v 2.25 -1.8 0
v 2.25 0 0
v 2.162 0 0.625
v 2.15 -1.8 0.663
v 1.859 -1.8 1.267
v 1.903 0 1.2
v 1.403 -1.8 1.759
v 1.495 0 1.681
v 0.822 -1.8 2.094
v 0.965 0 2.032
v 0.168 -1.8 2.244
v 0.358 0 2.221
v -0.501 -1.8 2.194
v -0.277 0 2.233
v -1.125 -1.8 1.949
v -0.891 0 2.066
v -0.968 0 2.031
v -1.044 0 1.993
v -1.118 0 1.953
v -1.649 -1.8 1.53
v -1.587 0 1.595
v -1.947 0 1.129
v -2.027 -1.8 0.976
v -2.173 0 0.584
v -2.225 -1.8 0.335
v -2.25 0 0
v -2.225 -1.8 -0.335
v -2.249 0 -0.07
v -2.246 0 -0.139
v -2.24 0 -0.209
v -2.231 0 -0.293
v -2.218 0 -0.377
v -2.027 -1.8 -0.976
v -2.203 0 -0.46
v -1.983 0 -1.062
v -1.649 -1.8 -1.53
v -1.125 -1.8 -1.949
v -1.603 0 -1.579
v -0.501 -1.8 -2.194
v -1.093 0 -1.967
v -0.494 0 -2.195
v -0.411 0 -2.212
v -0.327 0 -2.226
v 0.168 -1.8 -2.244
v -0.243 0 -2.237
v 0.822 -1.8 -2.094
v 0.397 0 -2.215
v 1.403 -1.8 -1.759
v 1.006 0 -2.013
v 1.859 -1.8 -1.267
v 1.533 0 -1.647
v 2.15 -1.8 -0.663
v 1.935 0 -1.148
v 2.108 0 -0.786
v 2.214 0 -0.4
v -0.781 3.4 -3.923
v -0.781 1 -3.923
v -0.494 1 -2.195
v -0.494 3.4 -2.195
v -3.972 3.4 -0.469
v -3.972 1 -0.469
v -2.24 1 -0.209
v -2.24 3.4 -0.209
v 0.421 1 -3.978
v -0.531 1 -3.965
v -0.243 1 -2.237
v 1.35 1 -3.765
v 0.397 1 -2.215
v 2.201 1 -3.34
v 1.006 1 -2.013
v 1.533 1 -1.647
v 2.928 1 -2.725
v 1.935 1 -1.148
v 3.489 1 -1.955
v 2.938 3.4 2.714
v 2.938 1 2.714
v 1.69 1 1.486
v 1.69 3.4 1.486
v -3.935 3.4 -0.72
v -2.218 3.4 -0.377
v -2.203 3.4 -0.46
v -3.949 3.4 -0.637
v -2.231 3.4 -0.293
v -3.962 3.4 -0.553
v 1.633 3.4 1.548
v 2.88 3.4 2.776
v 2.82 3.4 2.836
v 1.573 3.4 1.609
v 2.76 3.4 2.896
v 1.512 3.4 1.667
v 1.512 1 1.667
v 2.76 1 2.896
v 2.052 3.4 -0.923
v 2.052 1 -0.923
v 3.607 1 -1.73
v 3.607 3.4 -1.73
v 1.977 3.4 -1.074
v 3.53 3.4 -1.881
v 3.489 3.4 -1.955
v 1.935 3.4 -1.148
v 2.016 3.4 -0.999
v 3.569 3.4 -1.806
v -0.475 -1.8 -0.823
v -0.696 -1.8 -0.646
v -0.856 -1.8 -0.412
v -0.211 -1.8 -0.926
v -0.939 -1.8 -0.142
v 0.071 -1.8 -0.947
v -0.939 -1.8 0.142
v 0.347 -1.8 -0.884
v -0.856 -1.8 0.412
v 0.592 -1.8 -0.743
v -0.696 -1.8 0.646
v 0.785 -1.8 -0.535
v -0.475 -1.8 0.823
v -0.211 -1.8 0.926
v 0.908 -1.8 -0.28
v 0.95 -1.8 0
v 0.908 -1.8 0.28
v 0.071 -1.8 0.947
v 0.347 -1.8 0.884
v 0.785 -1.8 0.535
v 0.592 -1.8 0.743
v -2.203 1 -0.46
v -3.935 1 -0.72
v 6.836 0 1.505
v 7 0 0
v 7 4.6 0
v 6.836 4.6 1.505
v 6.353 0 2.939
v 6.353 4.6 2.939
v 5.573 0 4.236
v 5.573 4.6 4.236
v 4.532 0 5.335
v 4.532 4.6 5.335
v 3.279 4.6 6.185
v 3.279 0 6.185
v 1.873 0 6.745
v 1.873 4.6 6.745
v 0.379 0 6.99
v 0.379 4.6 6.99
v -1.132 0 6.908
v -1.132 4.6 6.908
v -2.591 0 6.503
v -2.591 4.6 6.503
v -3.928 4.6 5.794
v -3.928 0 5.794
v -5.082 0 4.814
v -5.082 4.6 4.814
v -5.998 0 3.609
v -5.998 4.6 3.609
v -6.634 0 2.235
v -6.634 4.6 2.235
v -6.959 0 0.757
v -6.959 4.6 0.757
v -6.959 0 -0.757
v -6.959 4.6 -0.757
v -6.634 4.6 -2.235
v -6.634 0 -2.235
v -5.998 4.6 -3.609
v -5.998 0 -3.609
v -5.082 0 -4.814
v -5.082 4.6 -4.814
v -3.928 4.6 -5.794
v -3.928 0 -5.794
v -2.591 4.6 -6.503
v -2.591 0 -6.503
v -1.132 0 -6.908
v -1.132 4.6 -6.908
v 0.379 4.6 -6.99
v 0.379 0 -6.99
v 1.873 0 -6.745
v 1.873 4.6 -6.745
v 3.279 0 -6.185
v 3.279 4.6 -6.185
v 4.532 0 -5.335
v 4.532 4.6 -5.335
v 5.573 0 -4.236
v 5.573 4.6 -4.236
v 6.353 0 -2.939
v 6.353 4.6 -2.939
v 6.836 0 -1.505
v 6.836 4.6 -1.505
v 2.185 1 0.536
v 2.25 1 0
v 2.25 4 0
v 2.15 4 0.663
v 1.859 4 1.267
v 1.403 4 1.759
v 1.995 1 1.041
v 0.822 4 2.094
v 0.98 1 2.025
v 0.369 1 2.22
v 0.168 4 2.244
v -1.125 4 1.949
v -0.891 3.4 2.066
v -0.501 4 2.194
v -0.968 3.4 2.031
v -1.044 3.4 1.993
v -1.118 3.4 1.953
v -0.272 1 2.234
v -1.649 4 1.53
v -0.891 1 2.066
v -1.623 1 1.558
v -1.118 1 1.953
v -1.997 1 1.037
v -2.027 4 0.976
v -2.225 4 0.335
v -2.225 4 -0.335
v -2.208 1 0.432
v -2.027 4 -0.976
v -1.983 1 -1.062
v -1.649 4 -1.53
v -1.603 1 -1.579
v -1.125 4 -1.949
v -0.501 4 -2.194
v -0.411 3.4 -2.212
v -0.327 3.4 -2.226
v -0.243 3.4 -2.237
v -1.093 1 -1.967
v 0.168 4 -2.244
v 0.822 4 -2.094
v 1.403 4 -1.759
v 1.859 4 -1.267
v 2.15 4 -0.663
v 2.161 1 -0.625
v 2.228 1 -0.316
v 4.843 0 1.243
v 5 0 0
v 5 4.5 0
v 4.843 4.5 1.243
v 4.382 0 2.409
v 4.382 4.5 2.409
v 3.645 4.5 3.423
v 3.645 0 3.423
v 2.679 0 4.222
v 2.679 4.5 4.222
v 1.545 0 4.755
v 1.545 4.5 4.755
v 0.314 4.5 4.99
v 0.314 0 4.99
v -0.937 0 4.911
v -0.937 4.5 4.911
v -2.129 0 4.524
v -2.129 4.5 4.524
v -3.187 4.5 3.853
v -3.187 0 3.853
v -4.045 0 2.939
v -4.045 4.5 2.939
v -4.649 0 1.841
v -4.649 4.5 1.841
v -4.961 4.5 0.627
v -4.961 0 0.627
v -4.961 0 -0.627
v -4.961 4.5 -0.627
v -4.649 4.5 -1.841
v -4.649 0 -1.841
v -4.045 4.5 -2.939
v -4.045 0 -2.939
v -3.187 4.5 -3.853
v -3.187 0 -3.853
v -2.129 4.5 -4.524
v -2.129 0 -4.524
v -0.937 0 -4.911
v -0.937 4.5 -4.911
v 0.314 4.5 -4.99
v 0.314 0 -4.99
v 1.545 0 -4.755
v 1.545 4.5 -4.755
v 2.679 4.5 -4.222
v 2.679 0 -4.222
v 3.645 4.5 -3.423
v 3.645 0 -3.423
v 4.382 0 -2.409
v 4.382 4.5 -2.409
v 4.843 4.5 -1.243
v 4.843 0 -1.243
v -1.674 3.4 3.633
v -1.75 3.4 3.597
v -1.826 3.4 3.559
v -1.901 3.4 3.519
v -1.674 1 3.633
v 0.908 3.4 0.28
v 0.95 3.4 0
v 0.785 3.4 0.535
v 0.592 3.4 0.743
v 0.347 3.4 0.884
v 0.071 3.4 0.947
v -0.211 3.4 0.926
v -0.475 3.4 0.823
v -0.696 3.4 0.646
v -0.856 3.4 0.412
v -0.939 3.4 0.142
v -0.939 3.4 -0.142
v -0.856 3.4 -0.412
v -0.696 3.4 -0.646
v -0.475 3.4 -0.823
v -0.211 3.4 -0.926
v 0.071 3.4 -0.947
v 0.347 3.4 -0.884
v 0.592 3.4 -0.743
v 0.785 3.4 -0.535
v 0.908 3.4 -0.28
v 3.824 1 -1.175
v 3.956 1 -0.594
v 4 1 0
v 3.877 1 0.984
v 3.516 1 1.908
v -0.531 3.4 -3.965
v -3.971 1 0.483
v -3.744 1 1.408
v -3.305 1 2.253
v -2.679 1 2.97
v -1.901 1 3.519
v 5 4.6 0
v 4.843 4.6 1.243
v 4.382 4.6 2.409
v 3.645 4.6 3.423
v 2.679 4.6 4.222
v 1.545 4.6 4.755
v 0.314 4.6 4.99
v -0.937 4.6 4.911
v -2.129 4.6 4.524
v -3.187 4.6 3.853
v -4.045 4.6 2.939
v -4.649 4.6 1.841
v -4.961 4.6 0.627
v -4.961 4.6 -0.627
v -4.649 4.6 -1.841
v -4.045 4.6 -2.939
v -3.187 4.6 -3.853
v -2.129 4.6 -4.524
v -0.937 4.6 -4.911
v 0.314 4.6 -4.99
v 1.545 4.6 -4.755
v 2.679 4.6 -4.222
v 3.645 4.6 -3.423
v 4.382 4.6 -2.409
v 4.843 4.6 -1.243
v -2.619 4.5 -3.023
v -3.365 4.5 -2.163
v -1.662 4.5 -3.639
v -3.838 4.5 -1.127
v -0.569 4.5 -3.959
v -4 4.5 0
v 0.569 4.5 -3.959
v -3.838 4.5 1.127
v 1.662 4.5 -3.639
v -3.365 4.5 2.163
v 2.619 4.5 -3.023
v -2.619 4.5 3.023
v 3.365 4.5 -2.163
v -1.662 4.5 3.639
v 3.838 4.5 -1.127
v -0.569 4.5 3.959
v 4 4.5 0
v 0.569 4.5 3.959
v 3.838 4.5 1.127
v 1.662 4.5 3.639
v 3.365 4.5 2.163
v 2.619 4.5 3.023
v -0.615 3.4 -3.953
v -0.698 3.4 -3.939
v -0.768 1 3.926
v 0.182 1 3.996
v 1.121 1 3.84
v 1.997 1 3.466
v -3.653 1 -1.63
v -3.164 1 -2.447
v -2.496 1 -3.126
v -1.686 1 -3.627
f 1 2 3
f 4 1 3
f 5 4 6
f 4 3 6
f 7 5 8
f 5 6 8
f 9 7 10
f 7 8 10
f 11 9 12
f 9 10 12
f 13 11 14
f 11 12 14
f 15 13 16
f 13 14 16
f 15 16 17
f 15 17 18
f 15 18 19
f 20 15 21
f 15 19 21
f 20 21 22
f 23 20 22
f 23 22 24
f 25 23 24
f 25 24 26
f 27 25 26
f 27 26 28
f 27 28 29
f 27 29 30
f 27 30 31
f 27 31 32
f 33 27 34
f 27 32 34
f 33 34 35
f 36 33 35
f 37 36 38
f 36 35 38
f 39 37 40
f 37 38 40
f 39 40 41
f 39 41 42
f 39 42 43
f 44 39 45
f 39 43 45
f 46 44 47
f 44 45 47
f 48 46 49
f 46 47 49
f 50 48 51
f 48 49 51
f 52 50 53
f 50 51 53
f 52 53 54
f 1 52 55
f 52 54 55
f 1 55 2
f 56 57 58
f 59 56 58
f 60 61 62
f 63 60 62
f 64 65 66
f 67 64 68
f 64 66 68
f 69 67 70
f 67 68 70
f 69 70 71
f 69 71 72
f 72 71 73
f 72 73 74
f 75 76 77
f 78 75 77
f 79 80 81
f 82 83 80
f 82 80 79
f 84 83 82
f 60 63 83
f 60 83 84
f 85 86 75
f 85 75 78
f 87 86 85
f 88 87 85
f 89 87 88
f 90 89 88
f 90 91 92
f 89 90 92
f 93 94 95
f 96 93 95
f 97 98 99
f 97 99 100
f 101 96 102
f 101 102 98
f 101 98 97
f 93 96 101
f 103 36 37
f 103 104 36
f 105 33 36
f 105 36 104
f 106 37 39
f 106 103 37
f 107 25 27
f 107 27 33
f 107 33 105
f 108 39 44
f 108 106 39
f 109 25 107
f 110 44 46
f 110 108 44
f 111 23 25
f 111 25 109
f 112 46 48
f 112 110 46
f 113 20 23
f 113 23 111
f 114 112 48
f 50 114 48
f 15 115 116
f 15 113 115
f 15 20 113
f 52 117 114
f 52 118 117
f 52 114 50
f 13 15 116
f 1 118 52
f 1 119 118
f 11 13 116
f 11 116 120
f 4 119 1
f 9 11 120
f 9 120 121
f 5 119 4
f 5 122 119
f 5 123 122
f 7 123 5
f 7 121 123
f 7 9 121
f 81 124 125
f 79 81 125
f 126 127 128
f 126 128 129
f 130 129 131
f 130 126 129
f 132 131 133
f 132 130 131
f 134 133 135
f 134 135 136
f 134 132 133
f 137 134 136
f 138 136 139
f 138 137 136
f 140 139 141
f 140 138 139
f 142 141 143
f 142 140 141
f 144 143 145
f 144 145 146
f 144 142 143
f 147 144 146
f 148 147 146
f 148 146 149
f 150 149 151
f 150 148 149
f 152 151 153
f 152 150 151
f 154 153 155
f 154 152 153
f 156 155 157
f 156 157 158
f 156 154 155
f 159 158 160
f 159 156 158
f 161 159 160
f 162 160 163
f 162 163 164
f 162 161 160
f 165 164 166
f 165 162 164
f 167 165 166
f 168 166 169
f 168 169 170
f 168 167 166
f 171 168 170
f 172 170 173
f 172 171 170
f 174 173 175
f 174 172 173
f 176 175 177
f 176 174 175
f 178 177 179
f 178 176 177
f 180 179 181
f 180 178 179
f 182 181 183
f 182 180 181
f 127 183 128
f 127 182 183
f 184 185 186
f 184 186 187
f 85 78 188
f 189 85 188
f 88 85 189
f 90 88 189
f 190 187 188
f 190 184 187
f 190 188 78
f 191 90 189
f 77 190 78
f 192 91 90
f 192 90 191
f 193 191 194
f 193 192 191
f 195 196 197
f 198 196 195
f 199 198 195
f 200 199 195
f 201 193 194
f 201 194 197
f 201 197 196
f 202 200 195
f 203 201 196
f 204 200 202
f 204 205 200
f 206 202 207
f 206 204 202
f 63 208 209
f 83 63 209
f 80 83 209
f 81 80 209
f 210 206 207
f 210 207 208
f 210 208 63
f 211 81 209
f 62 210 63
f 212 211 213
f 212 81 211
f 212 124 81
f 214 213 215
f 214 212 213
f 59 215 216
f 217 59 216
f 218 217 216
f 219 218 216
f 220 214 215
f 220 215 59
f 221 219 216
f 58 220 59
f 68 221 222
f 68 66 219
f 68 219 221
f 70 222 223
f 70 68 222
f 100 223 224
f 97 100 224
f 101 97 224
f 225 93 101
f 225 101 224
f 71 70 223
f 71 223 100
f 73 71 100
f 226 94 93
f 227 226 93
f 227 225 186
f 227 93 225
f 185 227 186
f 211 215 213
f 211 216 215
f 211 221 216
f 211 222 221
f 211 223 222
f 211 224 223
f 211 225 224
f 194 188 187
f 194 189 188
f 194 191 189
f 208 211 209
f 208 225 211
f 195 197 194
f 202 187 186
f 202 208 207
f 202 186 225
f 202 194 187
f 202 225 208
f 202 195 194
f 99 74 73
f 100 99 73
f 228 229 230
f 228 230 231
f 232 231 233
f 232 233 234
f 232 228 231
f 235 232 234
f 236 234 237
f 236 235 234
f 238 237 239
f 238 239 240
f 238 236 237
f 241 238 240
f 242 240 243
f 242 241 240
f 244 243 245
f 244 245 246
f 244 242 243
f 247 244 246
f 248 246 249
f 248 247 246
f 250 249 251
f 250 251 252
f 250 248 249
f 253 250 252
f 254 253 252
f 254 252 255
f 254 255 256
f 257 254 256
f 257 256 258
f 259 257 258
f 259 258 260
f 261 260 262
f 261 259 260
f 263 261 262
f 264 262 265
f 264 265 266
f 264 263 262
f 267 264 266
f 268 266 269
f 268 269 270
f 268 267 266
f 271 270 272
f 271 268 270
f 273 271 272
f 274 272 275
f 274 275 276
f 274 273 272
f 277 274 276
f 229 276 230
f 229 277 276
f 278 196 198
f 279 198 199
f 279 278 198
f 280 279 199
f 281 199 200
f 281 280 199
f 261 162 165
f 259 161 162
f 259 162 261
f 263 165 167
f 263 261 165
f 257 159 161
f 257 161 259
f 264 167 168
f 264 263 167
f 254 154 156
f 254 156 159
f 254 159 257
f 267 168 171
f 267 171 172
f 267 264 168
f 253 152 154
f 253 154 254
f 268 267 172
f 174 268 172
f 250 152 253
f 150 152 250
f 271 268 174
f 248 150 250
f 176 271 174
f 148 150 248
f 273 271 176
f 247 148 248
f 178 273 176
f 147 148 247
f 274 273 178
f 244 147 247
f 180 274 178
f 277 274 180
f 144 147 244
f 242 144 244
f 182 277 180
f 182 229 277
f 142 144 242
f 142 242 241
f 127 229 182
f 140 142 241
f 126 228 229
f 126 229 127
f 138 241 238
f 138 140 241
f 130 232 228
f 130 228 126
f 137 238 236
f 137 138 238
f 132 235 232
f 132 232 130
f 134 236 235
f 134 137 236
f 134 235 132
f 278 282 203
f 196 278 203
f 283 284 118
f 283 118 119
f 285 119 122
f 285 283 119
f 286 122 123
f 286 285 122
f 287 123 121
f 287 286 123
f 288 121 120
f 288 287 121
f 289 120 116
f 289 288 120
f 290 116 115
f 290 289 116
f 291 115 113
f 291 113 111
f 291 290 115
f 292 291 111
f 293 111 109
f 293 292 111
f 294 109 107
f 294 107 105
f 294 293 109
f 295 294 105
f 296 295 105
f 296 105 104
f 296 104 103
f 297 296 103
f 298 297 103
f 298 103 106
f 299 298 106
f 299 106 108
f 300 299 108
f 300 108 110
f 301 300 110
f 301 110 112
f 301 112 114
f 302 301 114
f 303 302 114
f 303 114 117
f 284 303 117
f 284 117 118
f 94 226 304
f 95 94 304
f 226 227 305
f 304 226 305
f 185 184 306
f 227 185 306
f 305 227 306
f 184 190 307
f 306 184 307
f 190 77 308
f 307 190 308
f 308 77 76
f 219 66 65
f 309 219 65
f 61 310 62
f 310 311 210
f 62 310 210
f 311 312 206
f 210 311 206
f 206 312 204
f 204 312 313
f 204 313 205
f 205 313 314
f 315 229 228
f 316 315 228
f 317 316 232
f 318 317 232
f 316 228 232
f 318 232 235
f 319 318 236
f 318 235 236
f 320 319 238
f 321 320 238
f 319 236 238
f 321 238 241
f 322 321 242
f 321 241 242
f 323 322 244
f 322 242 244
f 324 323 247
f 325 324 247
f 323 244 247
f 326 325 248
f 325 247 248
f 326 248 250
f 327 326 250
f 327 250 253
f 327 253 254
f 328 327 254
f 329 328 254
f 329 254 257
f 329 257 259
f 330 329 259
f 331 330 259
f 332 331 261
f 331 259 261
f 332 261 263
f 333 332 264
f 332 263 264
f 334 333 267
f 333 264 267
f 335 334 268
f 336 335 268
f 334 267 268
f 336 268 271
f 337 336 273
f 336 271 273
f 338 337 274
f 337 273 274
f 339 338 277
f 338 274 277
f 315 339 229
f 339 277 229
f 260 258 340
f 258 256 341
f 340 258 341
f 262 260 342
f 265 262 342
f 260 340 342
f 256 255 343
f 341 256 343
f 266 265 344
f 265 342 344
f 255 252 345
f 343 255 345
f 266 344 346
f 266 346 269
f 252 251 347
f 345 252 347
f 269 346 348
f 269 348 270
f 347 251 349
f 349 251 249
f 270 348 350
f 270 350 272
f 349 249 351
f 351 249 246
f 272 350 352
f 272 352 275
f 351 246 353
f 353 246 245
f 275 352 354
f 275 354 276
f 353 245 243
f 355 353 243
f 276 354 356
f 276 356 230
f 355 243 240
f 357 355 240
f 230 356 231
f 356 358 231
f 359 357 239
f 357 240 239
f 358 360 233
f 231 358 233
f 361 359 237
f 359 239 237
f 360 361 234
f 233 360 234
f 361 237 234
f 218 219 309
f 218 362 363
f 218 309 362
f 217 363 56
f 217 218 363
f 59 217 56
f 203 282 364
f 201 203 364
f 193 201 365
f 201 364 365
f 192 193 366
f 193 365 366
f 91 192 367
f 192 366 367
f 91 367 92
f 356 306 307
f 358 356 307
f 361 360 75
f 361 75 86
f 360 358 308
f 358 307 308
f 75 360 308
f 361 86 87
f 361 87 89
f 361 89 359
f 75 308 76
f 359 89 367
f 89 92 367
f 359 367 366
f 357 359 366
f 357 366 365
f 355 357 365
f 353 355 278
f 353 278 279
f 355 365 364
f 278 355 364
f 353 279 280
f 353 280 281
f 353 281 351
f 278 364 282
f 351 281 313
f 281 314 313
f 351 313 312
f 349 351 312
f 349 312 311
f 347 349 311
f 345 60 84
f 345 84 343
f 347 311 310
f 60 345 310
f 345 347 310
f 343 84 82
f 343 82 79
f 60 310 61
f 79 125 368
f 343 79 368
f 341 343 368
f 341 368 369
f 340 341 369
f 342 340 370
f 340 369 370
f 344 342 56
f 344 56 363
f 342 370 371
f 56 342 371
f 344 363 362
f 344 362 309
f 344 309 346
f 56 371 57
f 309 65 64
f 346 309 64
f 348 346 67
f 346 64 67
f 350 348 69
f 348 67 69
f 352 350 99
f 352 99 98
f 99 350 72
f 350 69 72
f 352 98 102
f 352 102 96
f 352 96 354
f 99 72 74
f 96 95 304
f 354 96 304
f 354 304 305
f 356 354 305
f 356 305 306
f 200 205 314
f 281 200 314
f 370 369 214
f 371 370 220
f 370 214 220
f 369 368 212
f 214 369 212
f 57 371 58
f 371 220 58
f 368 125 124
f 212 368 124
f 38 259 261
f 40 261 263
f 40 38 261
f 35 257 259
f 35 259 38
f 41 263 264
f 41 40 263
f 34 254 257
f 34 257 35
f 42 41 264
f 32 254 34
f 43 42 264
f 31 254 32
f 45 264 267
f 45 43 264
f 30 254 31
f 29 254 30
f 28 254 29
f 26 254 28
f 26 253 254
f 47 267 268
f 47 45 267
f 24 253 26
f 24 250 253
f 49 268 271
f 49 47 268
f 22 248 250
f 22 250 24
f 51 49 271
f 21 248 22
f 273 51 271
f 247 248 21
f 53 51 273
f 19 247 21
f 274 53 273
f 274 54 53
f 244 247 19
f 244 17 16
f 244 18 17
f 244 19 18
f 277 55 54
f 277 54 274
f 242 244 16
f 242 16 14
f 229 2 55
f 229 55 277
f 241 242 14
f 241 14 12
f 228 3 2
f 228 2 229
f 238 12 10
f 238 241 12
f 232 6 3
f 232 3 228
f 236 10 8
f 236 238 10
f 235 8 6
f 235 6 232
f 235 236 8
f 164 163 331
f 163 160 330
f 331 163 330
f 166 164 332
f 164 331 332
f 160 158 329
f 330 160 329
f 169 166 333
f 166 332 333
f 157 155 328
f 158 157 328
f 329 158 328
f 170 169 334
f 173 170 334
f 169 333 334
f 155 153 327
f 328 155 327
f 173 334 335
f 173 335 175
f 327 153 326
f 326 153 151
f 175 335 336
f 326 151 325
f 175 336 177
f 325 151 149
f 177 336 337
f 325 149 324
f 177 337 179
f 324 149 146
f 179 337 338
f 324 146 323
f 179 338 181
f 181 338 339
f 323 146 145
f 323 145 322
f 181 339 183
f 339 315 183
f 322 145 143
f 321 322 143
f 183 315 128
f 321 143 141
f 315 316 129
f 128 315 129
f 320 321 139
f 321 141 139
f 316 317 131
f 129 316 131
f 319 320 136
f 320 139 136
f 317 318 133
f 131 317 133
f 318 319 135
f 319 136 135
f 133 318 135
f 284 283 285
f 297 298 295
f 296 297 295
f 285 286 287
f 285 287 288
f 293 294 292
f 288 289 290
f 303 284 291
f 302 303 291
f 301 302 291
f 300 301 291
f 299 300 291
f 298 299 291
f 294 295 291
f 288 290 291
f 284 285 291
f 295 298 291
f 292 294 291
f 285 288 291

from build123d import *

# Parameters (mm, degrees)
F0_R          = 7
F0_R_2        = 5
F1_DEPTH      = 4.6
F0_R_3        = 4
F2_DEPTH      = 4.5
F0_R_4        = 2.25
F3_DEPTH      = 1
F0_R_5        = 0.95
F4_DEPTH      = 4
F4_DEPTH_BACK = 1.8
F6_DEPTH      = 2.4
F5_R          = 0.95
F7_DEPTH      = 1
F8_R          = 0.95
F9_DEPTH      = 0.6


with BuildPart() as f1:
    # F0 (on Front) → F1 (new body)
    with BuildSketch(Plane.XZ):
        Circle(F0_R)
        Circle(F0_R_2, mode=Mode.SUBTRACT)
    extrude(amount=-F1_DEPTH)


with BuildPart() as f2:
    # F0 (on Front) → F2 (new body)
    with BuildSketch(Plane.XZ):
        Circle(F0_R_2)
        Circle(F0_R_3, mode=Mode.SUBTRACT)
    extrude(amount=-F2_DEPTH)

    # F0 (on Front) → F3 (join)
    with BuildSketch(Plane.XZ):
        Circle(F0_R_3)
        Circle(F0_R_4, mode=Mode.SUBTRACT)
    extrude(amount=-F3_DEPTH)

    # F0 (on Front) → F4 (join, two sides)
    with BuildSketch(Plane.XZ) as f4_sk:
        Circle(F0_R_4)
        Circle(F0_R_5, mode=Mode.SUBTRACT)
    extrude(amount=-F4_DEPTH)
    extrude(f4_sk.sketch, amount=F4_DEPTH_BACK)

    # F5 (on face) → F6, piece 2 (join)
    with BuildSketch(Plane(origin=(0, 1, 0), x_dir=(-1, 0, 0), z_dir=(0, 1, 0))):
        with BuildLine():
            ThreePointArc((1.9010607717, 3.51937039), (1.7882791688, 3.5779963128), (1.673691774, 3.6330091998))
            Line((1.673691774, 3.6330091998), (0.8906165084, 2.066228989))
            ThreePointArc((0.8906165084, 2.066228989), (1.0059070324, 2.012622926), (1.1179855061, 1.9525901793))
            Line((1.1179855061, 1.9525901793), (1.9010607717, 3.51937039))
        make_face()
        with BuildLine():
            Line((1.7775915791, 3.840892357), (1.673691774, 3.6330091998))
            ThreePointArc((1.673691774, 3.6330091998), (1.7882791688, 3.5779963128), (1.9010607717, 3.51937039))
            Line((1.9010607717, 3.51937039), (2.0049605768, 3.7272535472))
            Line((2.0049605768, 3.7272535472), (1.7775915791, 3.840892357))
        make_face()
        with BuildLine():
            ThreePointArc((3.9345802285, -0.7204709748), (3.9554853624, -0.59509289), (3.9723962747, -0.4691138844))
            Line((3.9723962747, -0.4691138844), (2.2403161807, -0.2085267619))
            ThreePointArc((2.2403161807, -0.2085267619), (2.2249605164, -0.3347397506), (2.2025001345, -0.4598838523))
            Line((2.2025001345, -0.4598838523), (3.9345802285, -0.7204709748))
        make_face()
        with BuildLine():
            Line((4.2022117115, -0.5036890427), (3.9723962747, -0.4691138844))
            ThreePointArc((3.9723962747, -0.4691138844), (3.9554853624, -0.59509289), (3.9345802285, -0.7204709748))
            Line((3.9345802285, -0.7204709748), (4.1643956653, -0.7550461331))
            Line((4.1643956653, -0.7550461331), (4.2022117115, -0.5036890427))
        make_face()
        with BuildLine():
            ThreePointArc((2.2025001345, -0.4598838523), (2.2249605164, -0.3347397506), (2.2403161807, -0.2085267619))
            Line((2.2403161807, -0.2085267619), (2.0992291659, -0.1873005731))
            Line((2.0992291659, -0.1873005731), (2.0614131197, -0.4386576634))
            Line((2.0614131197, -0.4386576634), (2.2025001345, -0.4598838523))
        make_face()
        with BuildLine():
            ThreePointArc((1.1179855061, 1.9525901793), (1.0059070324, 2.012622926), (0.8906165084, 2.066228989))
            Line((0.8906165084, 2.066228989), (0.8268309179, 1.9386065173))
            Line((0.8268309179, 1.9386065173), (1.0541999156, 1.8249677076))
            Line((1.0541999156, 1.8249677076), (1.1179855061, 1.9525901793))
        make_face()
        with BuildLine():
            Line((0.2432344372, -2.2368140308), (0.5306435409, -3.9646459404))
            ThreePointArc((0.5306435409, -3.9646459404), (0.6563452272, -3.9457839453), (0.7813841406, -3.922937525))
            Line((0.7813841406, -3.922937525), (0.4939750369, -2.1951056154))
            ThreePointArc((0.4939750369, -2.1951056154), (0.3691941903, -2.2195034692), (0.2432344372, -2.2368140308))
        make_face()
        with BuildLine():
            ThreePointArc((0.7813841406, -3.922937525), (0.6563452272, -3.9457839453), (0.5306435409, -3.9646459404))
            Line((0.5306435409, -3.9646459404), (0.5687774869, -4.1938977206))
            Line((0.5687774869, -4.1938977206), (0.8195180866, -4.1521893052))
            Line((0.8195180866, -4.1521893052), (0.7813841406, -3.922937525))
        make_face()
        with BuildLine():
            Line((0.2198234572, -2.096073053), (0.2432344372, -2.2368140308))
            ThreePointArc((0.2432344372, -2.2368140308), (0.3691941903, -2.2195034692), (0.4939750369, -2.1951056154))
            Line((0.4939750369, -2.1951056154), (0.4705640568, -2.0543646376))
            Line((0.4705640568, -2.0543646376), (0.2198234572, -2.096073053))
        make_face()
        with BuildLine():
            Line((-1.5115470928, 1.6666509492), (-2.7596600569, 2.8955614948))
            ThreePointArc((-2.7596600569, 2.8955614948), (-2.8502680547, 2.8064162229), (-2.9379978717, 2.7144370514))
            Line((-2.9379978717, 2.7144370514), (-1.6898849076, 1.4855265057))
            ThreePointArc((-1.6898849076, 1.4855265057), (-1.6032757808, 1.5786091254), (-1.5115470928, 1.6666509492))
        make_face()
        with BuildLine():
            Line((-1.9255547516, -0.8567867262), (-2.052172985, -0.9225432453))
            ThreePointArc((-2.052172985, -0.9225432453), (-1.9967859583, -1.0369888315), (-1.9350228183, -1.1481231173))
            Line((-1.9350228183, -1.1481231173), (-1.8084045849, -1.0823665983))
            Line((-1.8084045849, -1.0823665983), (-1.9255547516, -0.8567867262))
        make_face()
        with BuildLine():
            Line((-2.052172985, -0.9225432453), (-3.6066244843, -1.7298149697))
            ThreePointArc((-3.6066244843, -1.7298149697), (-3.5498417037, -1.8435357005), (-3.4894743176, -1.9553948417))
            Line((-3.4894743176, -1.9553948417), (-1.9350228183, -1.1481231173))
            ThreePointArc((-1.9350228183, -1.1481231173), (-1.9967859583, -1.0369888315), (-2.052172985, -0.9225432453))
        make_face()
    extrude(amount=F6_DEPTH)



with BuildPart() as f6:
    # F5 (on face) → F6 (new body)
    with BuildSketch(Plane(origin=(0, 1, 0), x_dir=(-1, 0, 0), z_dir=(0, 1, 0))):
        Polygon((-1.4098817409, 1.5665497351), (-1.5105959334, 1.6657144235), (-1.6888917169, 1.4845485954), (-1.5882195557, 1.3854252916), align=None)
    extrude(amount=F6_DEPTH)


with BuildPart() as f2_1:
    add(f2.part)

    add(f6.part)  # F7 merges F6
    # F5 (on face) → F7 (join)
    with BuildSketch(Plane(origin=(0, 1, 0), x_dir=(-1, 0, 0), z_dir=(0, 1, 0))):
        with BuildLine():
            Line((-1.4954074808, 1.681147366), (-1.5105959334, 1.6657144235))
            Line((-1.5105959334, 1.6657144235), (-1.4098817409, 1.5665497351))
            Line((-1.4098817409, 1.5665497351), (-1.5882195557, 1.3854252916))
            Line((-1.5882195557, 1.3854252916), (-1.6888917169, 1.4845485954))
            Line((-1.6888917169, 1.4845485954), (-1.7048110393, 1.4683730181))
            ThreePointArc((-1.7048110393, 1.4683730181), (-2.226623539, 0.3234928369), (-2.052172985, -0.9225432453))
            Line((-2.052172985, -0.9225432453), (-1.9255547516, -0.8567867262))
            Line((-1.9255547516, -0.8567867262), (-1.8084045849, -1.0823665983))
            Line((-1.8084045849, -1.0823665983), (-1.9350228183, -1.1481231173))
            ThreePointArc((-1.9350228183, -1.1481231173), (-1.0059070324, -2.012622926), (0.2432344372, -2.2368140308))
            Line((0.2432344372, -2.2368140308), (0.2198234572, -2.096073053))
            Line((0.2198234572, -2.096073053), (0.4705640568, -2.0543646376))
            Line((0.4705640568, -2.0543646376), (0.4939750369, -2.1951056154))
            ThreePointArc((0.4939750369, -2.1951056154), (1.6032757808, -1.5786091254), (2.2025001345, -0.4598838523))
            Line((2.2025001345, -0.4598838523), (2.0614131197, -0.4386576634))
            Line((2.0614131197, -0.4386576634), (2.0992291659, -0.1873005731))
            Line((2.0992291659, -0.1873005731), (2.2403161807, -0.2085267619))
            ThreePointArc((2.2403161807, -0.2085267619), (2.2475777413, -0.1043757477), (2.25, 0))
            ThreePointArc((2.25, 0), (1.9465311953, 1.1285017969), (1.1179855061, 1.9525901793))
            Line((1.1179855061, 1.9525901793), (1.0541999156, 1.8249677076))
            Line((1.0541999156, 1.8249677076), (0.8268309179, 1.9386065173))
            Line((0.8268309179, 1.9386065173), (0.8906165084, 2.066228989))
            ThreePointArc((0.8906165084, 2.066228989), (-0.3584898802, 2.221257528), (-1.4954074808, 1.681147366))
        make_face()
        Circle(F5_R, mode=Mode.SUBTRACT)
    extrude(amount=-F7_DEPTH)

    # F8 (on face) → F9 (join)
    with BuildSketch(Plane(origin=(0, 4, 0), x_dir=(-1, 0, 0), z_dir=(0, 1, 0))):
        Circle(F8_R)
    extrude(amount=-F9_DEPTH)


solid = Compound([f1.part, f2_1.part])
